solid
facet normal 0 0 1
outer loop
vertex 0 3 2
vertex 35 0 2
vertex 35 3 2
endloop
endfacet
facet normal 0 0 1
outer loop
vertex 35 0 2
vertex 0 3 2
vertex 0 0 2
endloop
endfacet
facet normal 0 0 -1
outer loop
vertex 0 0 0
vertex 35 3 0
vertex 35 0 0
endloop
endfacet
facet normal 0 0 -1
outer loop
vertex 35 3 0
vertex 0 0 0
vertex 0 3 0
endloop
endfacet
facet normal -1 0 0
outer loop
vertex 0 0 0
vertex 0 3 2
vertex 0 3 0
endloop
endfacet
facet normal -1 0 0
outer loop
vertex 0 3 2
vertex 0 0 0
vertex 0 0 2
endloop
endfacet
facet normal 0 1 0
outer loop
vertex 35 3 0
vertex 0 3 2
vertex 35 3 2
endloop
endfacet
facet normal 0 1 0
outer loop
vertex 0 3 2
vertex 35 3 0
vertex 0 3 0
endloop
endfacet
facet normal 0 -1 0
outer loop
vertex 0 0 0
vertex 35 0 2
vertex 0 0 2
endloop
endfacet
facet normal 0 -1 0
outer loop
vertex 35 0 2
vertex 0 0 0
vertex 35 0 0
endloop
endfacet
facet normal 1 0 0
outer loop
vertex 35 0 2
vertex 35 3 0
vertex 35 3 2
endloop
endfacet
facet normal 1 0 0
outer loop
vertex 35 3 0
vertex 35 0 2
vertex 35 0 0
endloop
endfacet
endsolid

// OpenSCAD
translate([2.5, 1.5, 1.0]) color([0.13781274972163116, 0.1232982180791492, 0.12051785276403837]) cube([5, 3, 2], center=true);
translate([7.5, 1.5, 1.0]) color([0.4012165411640888, 0.4679428423906348, 0.5596131508667647]) cube([5, 3, 2], center=true);
translate([12.5, 1.5, 1.0]) color([0.29896126951320356, 0.6321114709426877, 0.7423454703026071]) cube([5, 3, 2], center=true);
translate([17.5, 1.5, 1.0]) color([0.21800995973285464, 0.48885816108208613, 0.501567157493831]) cube([5, 3, 2], center=true);
translate([22.5, 1.5, 1.0]) color([0.49271975198428686, 0.958422556968198, 0.44398175403613704]) cube([5, 3, 2], center=true);
translate([27.5, 1.5, 1.0]) color([0.14281143058247625, 0.4955231327742775, 0.8873352305676206]) cube([5, 3, 2], center=true);
translate([32.5, 1.5, 1.0]) color([0.21571394075115613, 0.3554013630116646, 0.39096604949642]) cube([5, 3, 2], center=true);
